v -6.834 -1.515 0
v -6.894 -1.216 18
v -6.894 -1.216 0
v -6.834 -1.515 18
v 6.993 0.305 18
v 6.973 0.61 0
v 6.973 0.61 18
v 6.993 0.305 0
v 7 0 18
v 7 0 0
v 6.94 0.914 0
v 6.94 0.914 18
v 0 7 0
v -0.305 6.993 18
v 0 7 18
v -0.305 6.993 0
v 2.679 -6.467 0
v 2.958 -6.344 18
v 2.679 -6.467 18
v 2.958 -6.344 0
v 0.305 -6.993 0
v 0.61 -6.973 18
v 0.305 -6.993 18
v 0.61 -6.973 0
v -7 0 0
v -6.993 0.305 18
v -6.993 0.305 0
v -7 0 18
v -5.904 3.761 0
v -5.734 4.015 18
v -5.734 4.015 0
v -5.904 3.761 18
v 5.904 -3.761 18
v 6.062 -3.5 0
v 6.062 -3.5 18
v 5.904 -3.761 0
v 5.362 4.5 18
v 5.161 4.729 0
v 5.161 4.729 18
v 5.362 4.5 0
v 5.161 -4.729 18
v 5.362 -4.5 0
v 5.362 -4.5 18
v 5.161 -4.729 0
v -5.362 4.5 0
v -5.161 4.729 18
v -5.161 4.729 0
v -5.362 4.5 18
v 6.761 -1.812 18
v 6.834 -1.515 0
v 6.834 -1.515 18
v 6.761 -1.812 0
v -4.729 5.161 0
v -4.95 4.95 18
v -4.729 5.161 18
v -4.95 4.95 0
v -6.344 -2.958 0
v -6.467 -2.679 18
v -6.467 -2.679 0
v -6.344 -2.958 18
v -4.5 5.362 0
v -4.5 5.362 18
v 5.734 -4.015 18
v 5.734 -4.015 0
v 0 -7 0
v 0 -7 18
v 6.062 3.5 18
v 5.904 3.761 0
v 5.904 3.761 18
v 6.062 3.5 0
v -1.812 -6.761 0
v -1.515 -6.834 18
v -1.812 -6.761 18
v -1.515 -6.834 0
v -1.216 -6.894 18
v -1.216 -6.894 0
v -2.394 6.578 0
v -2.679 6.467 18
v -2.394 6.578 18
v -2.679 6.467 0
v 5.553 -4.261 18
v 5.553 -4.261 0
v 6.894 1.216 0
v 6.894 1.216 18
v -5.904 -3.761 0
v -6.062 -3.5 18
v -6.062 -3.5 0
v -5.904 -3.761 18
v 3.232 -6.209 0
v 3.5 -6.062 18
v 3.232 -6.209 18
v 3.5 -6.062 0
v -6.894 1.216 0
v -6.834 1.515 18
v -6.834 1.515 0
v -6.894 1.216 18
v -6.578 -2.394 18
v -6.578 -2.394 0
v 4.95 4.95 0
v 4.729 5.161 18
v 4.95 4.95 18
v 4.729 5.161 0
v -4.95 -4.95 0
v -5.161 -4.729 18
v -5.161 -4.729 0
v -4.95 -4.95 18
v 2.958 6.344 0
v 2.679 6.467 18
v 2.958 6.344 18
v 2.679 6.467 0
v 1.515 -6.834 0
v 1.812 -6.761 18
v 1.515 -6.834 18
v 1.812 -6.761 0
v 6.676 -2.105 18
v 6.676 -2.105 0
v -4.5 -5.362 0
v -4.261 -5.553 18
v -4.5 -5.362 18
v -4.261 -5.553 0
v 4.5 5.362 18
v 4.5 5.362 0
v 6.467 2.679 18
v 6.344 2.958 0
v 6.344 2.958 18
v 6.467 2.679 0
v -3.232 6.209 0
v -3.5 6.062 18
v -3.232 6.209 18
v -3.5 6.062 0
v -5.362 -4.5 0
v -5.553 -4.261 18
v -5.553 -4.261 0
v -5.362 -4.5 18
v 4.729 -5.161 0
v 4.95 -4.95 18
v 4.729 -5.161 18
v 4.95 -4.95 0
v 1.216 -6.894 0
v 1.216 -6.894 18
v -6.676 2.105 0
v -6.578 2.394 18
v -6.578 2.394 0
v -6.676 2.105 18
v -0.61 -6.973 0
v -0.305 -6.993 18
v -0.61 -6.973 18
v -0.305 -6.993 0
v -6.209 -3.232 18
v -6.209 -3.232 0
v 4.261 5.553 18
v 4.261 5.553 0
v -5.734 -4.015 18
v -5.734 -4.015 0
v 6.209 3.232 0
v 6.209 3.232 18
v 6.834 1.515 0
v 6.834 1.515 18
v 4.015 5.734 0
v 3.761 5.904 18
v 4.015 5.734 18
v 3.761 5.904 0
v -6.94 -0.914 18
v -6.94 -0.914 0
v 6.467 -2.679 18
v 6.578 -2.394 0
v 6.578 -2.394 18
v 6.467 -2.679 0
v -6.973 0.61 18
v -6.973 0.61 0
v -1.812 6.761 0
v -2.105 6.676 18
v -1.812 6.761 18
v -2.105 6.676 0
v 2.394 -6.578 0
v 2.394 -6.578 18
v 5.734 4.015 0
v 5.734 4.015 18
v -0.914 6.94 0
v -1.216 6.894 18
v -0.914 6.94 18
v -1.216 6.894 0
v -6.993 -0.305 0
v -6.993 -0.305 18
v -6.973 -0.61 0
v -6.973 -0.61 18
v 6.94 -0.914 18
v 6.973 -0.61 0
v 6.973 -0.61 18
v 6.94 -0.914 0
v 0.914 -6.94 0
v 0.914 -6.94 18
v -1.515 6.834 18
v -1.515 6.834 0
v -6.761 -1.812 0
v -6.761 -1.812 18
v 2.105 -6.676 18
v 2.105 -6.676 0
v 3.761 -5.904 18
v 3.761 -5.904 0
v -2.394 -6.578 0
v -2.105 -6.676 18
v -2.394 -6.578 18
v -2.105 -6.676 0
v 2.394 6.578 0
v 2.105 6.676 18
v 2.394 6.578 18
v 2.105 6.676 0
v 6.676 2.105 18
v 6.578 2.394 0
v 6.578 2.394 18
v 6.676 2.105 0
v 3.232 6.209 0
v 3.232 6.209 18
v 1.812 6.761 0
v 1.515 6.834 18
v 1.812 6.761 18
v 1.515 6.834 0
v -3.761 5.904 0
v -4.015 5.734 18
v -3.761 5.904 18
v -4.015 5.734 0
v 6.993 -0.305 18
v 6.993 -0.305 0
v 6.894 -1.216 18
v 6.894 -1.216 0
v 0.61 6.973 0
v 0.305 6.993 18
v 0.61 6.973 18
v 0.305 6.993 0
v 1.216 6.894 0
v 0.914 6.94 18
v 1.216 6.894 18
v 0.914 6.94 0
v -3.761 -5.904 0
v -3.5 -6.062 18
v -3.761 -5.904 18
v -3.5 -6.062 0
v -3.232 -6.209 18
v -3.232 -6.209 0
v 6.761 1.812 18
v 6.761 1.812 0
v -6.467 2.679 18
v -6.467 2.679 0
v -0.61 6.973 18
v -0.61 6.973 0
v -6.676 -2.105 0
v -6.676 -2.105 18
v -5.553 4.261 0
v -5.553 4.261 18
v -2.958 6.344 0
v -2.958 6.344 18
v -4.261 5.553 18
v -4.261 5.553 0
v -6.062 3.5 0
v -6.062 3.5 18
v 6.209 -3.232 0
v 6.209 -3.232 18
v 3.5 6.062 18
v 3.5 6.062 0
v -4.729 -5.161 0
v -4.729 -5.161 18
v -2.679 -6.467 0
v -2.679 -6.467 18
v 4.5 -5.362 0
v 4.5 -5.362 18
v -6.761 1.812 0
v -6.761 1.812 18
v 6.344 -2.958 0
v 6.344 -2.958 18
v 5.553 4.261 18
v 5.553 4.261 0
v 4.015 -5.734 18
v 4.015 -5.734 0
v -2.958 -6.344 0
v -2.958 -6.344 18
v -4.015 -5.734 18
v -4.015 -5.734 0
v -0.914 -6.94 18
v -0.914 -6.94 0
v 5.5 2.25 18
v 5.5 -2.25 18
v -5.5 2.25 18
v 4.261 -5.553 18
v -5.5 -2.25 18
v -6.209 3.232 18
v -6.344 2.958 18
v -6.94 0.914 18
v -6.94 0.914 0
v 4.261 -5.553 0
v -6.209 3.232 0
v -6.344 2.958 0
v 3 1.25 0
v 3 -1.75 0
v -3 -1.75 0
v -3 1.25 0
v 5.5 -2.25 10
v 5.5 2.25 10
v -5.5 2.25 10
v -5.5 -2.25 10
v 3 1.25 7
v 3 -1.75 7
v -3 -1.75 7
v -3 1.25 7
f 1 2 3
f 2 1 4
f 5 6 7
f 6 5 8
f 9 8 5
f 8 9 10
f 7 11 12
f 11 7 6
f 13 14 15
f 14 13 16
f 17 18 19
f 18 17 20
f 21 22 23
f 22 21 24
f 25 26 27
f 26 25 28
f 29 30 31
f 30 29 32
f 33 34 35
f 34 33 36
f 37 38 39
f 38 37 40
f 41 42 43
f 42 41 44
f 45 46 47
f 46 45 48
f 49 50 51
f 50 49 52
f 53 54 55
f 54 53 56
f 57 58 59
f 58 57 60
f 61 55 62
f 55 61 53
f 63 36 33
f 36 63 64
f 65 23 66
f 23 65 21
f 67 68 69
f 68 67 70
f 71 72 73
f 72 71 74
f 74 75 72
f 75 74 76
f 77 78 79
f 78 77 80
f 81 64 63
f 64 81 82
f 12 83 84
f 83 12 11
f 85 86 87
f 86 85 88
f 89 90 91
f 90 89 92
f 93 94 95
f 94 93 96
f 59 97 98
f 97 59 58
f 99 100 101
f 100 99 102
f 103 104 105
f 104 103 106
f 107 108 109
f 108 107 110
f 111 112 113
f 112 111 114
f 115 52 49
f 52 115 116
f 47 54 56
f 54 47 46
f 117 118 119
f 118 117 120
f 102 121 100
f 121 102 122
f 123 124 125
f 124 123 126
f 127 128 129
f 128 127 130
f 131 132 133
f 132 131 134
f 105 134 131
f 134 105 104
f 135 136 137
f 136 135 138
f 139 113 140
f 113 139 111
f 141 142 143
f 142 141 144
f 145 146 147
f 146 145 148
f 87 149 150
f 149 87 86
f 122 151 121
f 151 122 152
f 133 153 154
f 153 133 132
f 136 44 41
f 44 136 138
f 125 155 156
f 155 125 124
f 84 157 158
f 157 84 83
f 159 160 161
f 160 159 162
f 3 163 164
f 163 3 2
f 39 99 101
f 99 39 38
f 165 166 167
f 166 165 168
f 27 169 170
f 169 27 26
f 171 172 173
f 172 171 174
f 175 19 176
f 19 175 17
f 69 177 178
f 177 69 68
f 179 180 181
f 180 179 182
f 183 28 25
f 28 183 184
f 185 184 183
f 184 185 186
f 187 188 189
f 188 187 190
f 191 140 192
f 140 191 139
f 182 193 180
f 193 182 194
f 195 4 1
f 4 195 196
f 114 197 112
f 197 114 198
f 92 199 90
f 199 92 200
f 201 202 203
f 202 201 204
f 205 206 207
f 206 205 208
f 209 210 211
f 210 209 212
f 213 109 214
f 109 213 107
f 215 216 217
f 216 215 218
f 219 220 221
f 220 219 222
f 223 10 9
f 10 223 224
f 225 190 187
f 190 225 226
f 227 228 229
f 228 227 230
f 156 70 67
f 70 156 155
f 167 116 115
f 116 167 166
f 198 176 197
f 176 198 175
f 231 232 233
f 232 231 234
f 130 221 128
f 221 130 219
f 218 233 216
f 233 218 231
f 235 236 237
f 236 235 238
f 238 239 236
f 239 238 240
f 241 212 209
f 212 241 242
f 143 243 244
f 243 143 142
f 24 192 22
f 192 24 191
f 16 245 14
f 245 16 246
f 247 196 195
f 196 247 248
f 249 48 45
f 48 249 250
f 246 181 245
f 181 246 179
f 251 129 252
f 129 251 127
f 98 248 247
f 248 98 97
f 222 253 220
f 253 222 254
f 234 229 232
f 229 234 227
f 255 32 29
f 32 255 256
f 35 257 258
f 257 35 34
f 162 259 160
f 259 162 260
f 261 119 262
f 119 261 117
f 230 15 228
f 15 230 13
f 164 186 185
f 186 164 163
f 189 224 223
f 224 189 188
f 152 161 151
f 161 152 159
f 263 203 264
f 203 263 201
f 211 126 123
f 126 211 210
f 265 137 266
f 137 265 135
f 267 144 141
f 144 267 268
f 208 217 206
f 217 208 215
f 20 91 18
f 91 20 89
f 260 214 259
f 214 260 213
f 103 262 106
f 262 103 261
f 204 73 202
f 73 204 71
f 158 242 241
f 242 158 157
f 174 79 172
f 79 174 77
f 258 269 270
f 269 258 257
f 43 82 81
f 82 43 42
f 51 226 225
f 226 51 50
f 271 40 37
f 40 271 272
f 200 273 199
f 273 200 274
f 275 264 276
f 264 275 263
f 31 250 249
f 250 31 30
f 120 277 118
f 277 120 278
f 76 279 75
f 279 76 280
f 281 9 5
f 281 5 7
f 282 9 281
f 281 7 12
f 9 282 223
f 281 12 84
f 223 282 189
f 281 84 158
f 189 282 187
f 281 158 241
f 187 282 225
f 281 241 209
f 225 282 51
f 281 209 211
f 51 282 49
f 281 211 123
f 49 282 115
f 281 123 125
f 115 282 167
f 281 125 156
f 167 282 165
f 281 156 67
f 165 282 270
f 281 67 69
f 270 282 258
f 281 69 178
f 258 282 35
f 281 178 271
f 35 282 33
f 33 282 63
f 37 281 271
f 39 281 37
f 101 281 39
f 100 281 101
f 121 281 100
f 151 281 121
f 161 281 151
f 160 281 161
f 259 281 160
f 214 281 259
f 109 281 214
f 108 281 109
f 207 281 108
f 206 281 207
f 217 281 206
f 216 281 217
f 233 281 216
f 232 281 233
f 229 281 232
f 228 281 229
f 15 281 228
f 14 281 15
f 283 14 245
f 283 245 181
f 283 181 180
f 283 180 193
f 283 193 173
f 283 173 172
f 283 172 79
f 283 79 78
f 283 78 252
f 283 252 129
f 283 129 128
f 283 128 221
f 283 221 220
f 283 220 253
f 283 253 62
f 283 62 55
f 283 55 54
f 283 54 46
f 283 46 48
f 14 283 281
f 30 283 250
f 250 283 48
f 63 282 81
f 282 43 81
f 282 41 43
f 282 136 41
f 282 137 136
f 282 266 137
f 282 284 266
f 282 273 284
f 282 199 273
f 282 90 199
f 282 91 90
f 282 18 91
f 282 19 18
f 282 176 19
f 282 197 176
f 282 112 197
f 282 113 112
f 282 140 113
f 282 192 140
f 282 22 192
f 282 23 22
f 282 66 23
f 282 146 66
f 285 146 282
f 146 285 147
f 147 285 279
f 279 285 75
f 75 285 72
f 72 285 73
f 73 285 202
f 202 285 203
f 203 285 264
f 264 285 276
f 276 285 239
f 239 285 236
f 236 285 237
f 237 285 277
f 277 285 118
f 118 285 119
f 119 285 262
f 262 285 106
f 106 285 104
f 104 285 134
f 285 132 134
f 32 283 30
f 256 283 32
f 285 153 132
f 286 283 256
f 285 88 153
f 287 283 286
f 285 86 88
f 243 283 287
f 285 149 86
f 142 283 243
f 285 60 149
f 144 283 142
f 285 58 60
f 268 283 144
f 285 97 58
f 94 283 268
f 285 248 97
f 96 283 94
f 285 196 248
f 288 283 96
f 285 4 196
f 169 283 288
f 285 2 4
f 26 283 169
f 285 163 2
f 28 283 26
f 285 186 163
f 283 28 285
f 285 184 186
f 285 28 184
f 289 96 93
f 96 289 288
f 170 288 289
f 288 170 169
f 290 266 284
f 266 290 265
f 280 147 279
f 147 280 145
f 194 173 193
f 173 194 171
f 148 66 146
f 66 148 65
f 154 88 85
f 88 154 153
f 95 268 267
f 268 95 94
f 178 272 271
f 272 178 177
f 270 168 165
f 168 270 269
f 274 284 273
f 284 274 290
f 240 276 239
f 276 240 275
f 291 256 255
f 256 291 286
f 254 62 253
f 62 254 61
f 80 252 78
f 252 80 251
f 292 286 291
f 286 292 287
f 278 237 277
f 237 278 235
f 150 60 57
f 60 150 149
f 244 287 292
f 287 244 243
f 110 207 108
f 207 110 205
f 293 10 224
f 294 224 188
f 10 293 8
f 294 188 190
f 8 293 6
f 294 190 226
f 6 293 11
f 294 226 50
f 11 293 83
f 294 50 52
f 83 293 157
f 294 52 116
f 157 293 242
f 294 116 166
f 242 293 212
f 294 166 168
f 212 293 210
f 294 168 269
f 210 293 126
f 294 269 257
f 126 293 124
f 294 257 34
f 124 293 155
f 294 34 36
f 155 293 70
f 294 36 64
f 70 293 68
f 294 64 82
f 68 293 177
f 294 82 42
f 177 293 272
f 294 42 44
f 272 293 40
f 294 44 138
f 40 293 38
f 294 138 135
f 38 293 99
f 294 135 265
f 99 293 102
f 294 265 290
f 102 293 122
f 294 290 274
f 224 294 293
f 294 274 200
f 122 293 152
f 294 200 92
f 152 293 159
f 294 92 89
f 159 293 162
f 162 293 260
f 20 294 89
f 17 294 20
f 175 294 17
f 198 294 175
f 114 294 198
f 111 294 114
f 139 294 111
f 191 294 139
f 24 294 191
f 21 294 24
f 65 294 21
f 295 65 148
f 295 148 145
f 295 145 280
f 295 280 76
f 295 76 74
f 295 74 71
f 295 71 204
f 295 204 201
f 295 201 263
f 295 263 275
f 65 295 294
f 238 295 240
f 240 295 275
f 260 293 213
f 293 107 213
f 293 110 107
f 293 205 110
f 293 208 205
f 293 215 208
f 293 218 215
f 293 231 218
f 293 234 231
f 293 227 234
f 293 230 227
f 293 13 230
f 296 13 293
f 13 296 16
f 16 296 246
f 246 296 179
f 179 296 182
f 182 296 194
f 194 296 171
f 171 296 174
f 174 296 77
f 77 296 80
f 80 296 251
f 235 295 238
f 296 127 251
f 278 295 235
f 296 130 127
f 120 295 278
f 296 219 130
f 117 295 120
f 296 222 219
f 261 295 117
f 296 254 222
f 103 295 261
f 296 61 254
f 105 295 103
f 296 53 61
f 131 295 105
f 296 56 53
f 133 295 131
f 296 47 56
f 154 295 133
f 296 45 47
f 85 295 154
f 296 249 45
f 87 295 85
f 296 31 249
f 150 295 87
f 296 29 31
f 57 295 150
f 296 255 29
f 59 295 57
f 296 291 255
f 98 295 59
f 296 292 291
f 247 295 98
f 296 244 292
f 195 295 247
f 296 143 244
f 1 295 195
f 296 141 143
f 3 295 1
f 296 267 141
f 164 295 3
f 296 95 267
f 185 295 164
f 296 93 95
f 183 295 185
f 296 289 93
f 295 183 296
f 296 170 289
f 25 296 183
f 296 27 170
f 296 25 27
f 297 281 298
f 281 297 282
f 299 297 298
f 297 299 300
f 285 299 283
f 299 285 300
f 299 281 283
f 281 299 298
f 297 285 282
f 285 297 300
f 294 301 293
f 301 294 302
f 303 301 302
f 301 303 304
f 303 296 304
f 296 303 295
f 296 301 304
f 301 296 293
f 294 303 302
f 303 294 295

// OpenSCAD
// this is based on thehookup's Motorized MQTT Blinds project:
// https://github.com/thehookup/Motorized_MQTT_Blinds/

$fn = 144;

difference() {
  cylinder(18, 7, 7);

  // blinds shaft
  translate([-11/2, -4.5/2, 10])
    cube([11, 4.5, 8]);

  // motor shaft
  translate([-6/2, -3.5/2, 0])
    cube([6, 3.0, 7]);
}
